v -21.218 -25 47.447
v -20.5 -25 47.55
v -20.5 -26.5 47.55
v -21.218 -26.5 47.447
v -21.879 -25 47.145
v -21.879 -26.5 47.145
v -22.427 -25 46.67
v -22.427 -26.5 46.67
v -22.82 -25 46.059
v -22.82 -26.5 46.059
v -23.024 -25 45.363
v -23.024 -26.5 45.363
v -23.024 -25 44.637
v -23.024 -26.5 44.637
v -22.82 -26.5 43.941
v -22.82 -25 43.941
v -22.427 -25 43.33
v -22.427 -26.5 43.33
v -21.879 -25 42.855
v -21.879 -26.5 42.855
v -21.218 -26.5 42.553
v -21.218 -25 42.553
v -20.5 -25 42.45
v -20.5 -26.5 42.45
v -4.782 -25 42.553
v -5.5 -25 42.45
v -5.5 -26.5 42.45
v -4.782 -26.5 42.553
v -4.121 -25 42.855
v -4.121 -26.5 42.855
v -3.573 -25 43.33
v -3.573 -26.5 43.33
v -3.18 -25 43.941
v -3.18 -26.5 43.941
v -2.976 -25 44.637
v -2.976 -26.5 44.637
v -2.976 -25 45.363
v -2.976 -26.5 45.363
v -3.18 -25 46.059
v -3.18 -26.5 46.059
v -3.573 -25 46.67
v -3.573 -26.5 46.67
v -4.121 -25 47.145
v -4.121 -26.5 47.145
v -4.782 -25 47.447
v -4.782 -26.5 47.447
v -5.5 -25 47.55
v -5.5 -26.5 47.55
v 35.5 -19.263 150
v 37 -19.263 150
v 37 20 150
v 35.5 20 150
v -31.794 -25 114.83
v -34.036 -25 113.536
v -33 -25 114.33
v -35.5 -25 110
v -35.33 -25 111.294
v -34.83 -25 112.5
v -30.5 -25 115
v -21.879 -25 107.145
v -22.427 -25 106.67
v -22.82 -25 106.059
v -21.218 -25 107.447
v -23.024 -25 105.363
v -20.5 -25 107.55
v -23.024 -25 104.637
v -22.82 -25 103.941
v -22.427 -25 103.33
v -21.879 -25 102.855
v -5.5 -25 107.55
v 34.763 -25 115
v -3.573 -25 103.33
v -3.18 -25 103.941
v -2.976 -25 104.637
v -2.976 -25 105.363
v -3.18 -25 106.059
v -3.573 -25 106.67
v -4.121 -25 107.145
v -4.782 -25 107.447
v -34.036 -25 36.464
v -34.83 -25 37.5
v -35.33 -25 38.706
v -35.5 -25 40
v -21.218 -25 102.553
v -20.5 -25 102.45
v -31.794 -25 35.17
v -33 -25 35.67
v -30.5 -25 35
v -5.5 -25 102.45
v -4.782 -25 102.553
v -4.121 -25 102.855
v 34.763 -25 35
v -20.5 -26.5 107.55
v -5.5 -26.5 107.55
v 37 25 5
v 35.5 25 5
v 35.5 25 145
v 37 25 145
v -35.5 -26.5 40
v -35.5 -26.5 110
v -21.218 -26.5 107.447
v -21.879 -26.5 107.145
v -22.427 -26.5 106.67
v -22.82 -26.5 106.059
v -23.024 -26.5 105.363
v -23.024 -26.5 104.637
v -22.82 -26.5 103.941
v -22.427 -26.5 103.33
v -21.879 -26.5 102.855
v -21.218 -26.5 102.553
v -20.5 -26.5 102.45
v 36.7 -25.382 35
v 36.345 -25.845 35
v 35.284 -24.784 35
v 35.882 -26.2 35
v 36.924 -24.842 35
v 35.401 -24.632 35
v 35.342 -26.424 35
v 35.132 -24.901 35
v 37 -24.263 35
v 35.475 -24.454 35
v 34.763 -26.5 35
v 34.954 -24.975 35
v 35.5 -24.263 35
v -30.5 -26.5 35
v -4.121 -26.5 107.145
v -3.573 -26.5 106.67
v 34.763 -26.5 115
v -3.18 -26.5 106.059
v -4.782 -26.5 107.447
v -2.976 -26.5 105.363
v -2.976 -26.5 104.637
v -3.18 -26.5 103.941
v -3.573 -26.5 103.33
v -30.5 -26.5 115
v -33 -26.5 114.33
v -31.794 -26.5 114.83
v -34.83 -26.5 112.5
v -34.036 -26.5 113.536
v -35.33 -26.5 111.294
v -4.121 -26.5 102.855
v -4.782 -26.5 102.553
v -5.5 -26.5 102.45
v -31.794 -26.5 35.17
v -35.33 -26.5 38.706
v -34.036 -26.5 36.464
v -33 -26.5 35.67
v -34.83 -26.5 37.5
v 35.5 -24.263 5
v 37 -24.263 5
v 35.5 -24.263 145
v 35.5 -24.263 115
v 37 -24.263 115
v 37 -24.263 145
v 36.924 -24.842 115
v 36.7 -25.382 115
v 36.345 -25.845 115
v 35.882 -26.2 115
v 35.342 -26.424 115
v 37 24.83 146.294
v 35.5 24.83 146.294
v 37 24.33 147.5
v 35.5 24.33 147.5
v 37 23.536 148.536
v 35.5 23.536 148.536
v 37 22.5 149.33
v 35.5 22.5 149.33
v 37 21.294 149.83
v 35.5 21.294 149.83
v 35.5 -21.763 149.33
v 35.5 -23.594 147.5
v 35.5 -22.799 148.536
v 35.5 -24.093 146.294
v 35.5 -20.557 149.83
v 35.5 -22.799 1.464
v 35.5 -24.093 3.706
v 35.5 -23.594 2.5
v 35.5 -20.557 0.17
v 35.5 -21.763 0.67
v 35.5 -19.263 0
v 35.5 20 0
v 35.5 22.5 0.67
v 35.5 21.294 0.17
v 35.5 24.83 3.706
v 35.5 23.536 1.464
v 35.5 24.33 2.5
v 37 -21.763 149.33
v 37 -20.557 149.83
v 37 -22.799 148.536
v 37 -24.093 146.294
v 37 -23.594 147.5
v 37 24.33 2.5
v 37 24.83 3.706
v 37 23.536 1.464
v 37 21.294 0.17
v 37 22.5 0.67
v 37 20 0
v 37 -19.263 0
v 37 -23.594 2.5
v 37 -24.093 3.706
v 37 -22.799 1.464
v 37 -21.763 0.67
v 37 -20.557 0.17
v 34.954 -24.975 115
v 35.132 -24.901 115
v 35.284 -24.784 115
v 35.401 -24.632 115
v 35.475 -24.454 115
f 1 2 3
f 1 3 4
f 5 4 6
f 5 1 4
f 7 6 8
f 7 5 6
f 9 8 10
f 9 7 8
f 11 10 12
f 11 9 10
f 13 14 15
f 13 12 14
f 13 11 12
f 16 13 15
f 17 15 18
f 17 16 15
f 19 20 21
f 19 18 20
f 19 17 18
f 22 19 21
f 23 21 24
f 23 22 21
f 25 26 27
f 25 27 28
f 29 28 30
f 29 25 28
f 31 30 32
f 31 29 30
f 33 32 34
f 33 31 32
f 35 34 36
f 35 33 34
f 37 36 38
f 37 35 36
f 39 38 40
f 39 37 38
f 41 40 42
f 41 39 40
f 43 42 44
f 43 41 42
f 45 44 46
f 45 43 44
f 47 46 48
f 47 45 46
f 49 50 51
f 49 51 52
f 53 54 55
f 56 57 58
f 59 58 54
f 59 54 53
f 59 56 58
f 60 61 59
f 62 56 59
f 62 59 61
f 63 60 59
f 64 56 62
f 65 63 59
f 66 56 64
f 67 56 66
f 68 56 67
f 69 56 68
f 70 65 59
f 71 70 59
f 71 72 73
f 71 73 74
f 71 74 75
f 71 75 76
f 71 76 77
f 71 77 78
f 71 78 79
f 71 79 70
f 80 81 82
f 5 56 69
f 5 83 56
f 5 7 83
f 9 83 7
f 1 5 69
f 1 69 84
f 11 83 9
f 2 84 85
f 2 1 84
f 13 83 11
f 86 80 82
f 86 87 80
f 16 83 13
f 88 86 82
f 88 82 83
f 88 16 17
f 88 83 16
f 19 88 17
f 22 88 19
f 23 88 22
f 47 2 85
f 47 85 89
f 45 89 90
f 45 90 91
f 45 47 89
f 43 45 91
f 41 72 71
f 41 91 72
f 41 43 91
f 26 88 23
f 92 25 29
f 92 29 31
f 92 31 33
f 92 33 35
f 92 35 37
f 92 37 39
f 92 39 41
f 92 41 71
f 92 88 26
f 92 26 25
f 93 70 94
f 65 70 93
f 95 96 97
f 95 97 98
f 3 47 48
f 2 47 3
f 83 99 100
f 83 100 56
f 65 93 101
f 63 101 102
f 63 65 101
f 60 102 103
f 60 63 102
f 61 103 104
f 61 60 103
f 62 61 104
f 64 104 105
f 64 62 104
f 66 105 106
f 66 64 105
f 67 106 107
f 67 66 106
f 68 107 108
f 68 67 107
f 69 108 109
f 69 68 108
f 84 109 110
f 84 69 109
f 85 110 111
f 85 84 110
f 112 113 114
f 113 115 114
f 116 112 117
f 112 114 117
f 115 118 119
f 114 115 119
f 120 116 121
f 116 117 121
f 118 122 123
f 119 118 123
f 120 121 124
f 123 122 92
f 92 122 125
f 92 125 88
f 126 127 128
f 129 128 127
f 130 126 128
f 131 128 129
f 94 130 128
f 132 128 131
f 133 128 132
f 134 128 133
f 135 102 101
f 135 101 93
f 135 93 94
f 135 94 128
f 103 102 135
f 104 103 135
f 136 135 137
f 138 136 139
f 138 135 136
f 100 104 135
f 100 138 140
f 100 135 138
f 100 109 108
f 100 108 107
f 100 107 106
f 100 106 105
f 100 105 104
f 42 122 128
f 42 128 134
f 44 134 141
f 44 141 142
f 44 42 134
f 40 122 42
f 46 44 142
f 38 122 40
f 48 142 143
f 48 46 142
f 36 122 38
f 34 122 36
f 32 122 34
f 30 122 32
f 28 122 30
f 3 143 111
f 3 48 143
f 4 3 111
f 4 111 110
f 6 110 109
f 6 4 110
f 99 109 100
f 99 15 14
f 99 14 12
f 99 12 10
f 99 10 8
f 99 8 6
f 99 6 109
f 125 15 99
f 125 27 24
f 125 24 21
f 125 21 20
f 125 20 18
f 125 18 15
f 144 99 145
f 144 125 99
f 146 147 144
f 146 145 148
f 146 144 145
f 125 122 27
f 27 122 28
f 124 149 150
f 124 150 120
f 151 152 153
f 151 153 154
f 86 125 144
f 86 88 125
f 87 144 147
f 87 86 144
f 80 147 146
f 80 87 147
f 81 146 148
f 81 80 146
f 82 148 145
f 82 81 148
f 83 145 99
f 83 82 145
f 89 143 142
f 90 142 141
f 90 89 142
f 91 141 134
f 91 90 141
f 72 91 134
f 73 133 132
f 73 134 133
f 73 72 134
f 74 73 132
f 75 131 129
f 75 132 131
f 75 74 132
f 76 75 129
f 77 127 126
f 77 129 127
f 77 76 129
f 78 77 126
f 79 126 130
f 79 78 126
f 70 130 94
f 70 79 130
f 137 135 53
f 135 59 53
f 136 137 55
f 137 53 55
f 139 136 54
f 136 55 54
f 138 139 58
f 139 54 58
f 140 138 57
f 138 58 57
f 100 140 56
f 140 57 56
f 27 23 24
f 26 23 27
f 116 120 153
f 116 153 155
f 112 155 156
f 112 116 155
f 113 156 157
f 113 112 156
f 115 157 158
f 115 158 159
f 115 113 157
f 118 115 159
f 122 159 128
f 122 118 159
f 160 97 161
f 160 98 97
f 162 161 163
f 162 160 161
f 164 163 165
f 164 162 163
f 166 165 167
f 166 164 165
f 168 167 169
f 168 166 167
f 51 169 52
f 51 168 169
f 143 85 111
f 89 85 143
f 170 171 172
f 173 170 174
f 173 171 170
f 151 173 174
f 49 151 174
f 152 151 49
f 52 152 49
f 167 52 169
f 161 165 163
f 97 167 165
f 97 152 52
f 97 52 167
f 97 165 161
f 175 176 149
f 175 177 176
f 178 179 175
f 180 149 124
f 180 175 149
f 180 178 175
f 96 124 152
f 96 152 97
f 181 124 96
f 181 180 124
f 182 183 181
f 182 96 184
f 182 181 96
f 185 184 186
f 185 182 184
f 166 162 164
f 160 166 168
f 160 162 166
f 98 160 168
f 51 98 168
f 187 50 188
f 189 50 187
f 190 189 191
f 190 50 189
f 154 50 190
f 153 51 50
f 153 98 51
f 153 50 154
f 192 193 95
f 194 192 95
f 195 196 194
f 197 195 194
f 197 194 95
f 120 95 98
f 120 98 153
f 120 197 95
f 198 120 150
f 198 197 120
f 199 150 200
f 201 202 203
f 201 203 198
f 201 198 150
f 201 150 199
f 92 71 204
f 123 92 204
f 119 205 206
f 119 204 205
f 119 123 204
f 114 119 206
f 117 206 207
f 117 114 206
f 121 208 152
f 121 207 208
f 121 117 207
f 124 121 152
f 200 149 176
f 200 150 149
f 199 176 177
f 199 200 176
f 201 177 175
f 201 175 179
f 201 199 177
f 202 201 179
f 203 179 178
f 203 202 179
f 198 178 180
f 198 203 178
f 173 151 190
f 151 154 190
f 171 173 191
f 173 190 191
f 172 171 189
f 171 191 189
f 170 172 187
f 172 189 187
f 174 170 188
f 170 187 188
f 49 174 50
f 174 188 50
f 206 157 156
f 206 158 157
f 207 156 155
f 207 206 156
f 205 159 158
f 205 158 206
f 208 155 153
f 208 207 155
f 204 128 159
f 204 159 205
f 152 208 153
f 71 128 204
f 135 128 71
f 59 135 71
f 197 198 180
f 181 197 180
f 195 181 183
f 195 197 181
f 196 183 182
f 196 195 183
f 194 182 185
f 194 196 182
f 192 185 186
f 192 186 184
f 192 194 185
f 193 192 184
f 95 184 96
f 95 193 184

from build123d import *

# Parameters (mm, degrees)
BASE_FLANGE1_DEPTH = 150
CUT_EXTRUDE2_DEPTH = 163.385344166
SKETCH5_W          = 35
SKETCH5_H          = 2.2366
CUT_EXTRUDE3_DEPTH = 169.696472992
FILLET1_R          = 5


# Sheet-metal steps are written as plain solids
with BuildPart() as part:
    # Sketch1 → Base-Flange1 (new body)
    with BuildSketch(Plane.XY):
        with BuildLine():
            Line((-35.5, -25), (34.7634, -25))
            ThreePointArc((34.7634, -25), (35.284254855, -24.784254855), (35.5, -24.2634))
            Line((35.5, -24.2634), (35.5, 25))
            Line((35.5, 25), (37, 25))
            Line((37, 25), (37, -24.2634))
            ThreePointArc((37, -24.2634), (36.344915027, -25.844915027), (34.7634, -26.5))
            Line((34.7634, -26.5), (-35.5, -26.5))
            Line((-35.5, -26.5), (-35.5, -25))
        make_face()
    extrude(amount=BASE_FLANGE1_DEPTH)

    # Sketch4 → Cut-Extrude2 (cut, through all)
    with BuildSketch(Plane(origin=(0, -25, 0), x_dir=(1, 0, 0), z_dir=(0, 1, 0))):
        with BuildLine():
            Line((-20.5, -102.45), (-5.5, -102.45))
            ThreePointArc((-5.5, -102.45), (-2.95, -105), (-5.5, -107.55))
            Line((-5.5, -107.55), (-20.5, -107.55))
            ThreePointArc((-20.5, -107.55), (-23.05, -105), (-20.5, -102.45))
        make_face()
        with BuildLine():
            Line((-20.5, -42.45), (-5.5, -42.45))
            ThreePointArc((-5.5, -42.45), (-2.95, -45), (-5.5, -47.55))
            Line((-5.5, -47.55), (-20.5, -47.55))
            ThreePointArc((-20.5, -47.55), (-23.05, -45), (-20.5, -42.45))
        make_face()
    extrude(amount=-CUT_EXTRUDE2_DEPTH, mode=Mode.SUBTRACT)

    # Sketch5 → Cut-Extrude3 (cut, through all)
    with BuildSketch(Plane.ZY.offset(35.5)):
        with Locations((132.5, -25.3817)):
            Rectangle(SKETCH5_W, SKETCH5_H)
        with Locations((17.5, -25.3817)):
            Rectangle(SKETCH5_W, SKETCH5_H)
    extrude(amount=-CUT_EXTRUDE3_DEPTH, mode=Mode.SUBTRACT)

    # Fillet1
    fillet1_edges = [part.edges().sort_by_distance(p)[0] for p in [
        (36.25, -24.2634, 0),
        (36.25, -24.2634, 150),
        (36.25, 25, 150),
        (-35.5, -25.75, 115),
        (36.25, 25, 0),
        (-35.5, -25.75, 35),
    ]]
    fillet(fillet1_edges, radius=FILLET1_R)


solid = part.part
